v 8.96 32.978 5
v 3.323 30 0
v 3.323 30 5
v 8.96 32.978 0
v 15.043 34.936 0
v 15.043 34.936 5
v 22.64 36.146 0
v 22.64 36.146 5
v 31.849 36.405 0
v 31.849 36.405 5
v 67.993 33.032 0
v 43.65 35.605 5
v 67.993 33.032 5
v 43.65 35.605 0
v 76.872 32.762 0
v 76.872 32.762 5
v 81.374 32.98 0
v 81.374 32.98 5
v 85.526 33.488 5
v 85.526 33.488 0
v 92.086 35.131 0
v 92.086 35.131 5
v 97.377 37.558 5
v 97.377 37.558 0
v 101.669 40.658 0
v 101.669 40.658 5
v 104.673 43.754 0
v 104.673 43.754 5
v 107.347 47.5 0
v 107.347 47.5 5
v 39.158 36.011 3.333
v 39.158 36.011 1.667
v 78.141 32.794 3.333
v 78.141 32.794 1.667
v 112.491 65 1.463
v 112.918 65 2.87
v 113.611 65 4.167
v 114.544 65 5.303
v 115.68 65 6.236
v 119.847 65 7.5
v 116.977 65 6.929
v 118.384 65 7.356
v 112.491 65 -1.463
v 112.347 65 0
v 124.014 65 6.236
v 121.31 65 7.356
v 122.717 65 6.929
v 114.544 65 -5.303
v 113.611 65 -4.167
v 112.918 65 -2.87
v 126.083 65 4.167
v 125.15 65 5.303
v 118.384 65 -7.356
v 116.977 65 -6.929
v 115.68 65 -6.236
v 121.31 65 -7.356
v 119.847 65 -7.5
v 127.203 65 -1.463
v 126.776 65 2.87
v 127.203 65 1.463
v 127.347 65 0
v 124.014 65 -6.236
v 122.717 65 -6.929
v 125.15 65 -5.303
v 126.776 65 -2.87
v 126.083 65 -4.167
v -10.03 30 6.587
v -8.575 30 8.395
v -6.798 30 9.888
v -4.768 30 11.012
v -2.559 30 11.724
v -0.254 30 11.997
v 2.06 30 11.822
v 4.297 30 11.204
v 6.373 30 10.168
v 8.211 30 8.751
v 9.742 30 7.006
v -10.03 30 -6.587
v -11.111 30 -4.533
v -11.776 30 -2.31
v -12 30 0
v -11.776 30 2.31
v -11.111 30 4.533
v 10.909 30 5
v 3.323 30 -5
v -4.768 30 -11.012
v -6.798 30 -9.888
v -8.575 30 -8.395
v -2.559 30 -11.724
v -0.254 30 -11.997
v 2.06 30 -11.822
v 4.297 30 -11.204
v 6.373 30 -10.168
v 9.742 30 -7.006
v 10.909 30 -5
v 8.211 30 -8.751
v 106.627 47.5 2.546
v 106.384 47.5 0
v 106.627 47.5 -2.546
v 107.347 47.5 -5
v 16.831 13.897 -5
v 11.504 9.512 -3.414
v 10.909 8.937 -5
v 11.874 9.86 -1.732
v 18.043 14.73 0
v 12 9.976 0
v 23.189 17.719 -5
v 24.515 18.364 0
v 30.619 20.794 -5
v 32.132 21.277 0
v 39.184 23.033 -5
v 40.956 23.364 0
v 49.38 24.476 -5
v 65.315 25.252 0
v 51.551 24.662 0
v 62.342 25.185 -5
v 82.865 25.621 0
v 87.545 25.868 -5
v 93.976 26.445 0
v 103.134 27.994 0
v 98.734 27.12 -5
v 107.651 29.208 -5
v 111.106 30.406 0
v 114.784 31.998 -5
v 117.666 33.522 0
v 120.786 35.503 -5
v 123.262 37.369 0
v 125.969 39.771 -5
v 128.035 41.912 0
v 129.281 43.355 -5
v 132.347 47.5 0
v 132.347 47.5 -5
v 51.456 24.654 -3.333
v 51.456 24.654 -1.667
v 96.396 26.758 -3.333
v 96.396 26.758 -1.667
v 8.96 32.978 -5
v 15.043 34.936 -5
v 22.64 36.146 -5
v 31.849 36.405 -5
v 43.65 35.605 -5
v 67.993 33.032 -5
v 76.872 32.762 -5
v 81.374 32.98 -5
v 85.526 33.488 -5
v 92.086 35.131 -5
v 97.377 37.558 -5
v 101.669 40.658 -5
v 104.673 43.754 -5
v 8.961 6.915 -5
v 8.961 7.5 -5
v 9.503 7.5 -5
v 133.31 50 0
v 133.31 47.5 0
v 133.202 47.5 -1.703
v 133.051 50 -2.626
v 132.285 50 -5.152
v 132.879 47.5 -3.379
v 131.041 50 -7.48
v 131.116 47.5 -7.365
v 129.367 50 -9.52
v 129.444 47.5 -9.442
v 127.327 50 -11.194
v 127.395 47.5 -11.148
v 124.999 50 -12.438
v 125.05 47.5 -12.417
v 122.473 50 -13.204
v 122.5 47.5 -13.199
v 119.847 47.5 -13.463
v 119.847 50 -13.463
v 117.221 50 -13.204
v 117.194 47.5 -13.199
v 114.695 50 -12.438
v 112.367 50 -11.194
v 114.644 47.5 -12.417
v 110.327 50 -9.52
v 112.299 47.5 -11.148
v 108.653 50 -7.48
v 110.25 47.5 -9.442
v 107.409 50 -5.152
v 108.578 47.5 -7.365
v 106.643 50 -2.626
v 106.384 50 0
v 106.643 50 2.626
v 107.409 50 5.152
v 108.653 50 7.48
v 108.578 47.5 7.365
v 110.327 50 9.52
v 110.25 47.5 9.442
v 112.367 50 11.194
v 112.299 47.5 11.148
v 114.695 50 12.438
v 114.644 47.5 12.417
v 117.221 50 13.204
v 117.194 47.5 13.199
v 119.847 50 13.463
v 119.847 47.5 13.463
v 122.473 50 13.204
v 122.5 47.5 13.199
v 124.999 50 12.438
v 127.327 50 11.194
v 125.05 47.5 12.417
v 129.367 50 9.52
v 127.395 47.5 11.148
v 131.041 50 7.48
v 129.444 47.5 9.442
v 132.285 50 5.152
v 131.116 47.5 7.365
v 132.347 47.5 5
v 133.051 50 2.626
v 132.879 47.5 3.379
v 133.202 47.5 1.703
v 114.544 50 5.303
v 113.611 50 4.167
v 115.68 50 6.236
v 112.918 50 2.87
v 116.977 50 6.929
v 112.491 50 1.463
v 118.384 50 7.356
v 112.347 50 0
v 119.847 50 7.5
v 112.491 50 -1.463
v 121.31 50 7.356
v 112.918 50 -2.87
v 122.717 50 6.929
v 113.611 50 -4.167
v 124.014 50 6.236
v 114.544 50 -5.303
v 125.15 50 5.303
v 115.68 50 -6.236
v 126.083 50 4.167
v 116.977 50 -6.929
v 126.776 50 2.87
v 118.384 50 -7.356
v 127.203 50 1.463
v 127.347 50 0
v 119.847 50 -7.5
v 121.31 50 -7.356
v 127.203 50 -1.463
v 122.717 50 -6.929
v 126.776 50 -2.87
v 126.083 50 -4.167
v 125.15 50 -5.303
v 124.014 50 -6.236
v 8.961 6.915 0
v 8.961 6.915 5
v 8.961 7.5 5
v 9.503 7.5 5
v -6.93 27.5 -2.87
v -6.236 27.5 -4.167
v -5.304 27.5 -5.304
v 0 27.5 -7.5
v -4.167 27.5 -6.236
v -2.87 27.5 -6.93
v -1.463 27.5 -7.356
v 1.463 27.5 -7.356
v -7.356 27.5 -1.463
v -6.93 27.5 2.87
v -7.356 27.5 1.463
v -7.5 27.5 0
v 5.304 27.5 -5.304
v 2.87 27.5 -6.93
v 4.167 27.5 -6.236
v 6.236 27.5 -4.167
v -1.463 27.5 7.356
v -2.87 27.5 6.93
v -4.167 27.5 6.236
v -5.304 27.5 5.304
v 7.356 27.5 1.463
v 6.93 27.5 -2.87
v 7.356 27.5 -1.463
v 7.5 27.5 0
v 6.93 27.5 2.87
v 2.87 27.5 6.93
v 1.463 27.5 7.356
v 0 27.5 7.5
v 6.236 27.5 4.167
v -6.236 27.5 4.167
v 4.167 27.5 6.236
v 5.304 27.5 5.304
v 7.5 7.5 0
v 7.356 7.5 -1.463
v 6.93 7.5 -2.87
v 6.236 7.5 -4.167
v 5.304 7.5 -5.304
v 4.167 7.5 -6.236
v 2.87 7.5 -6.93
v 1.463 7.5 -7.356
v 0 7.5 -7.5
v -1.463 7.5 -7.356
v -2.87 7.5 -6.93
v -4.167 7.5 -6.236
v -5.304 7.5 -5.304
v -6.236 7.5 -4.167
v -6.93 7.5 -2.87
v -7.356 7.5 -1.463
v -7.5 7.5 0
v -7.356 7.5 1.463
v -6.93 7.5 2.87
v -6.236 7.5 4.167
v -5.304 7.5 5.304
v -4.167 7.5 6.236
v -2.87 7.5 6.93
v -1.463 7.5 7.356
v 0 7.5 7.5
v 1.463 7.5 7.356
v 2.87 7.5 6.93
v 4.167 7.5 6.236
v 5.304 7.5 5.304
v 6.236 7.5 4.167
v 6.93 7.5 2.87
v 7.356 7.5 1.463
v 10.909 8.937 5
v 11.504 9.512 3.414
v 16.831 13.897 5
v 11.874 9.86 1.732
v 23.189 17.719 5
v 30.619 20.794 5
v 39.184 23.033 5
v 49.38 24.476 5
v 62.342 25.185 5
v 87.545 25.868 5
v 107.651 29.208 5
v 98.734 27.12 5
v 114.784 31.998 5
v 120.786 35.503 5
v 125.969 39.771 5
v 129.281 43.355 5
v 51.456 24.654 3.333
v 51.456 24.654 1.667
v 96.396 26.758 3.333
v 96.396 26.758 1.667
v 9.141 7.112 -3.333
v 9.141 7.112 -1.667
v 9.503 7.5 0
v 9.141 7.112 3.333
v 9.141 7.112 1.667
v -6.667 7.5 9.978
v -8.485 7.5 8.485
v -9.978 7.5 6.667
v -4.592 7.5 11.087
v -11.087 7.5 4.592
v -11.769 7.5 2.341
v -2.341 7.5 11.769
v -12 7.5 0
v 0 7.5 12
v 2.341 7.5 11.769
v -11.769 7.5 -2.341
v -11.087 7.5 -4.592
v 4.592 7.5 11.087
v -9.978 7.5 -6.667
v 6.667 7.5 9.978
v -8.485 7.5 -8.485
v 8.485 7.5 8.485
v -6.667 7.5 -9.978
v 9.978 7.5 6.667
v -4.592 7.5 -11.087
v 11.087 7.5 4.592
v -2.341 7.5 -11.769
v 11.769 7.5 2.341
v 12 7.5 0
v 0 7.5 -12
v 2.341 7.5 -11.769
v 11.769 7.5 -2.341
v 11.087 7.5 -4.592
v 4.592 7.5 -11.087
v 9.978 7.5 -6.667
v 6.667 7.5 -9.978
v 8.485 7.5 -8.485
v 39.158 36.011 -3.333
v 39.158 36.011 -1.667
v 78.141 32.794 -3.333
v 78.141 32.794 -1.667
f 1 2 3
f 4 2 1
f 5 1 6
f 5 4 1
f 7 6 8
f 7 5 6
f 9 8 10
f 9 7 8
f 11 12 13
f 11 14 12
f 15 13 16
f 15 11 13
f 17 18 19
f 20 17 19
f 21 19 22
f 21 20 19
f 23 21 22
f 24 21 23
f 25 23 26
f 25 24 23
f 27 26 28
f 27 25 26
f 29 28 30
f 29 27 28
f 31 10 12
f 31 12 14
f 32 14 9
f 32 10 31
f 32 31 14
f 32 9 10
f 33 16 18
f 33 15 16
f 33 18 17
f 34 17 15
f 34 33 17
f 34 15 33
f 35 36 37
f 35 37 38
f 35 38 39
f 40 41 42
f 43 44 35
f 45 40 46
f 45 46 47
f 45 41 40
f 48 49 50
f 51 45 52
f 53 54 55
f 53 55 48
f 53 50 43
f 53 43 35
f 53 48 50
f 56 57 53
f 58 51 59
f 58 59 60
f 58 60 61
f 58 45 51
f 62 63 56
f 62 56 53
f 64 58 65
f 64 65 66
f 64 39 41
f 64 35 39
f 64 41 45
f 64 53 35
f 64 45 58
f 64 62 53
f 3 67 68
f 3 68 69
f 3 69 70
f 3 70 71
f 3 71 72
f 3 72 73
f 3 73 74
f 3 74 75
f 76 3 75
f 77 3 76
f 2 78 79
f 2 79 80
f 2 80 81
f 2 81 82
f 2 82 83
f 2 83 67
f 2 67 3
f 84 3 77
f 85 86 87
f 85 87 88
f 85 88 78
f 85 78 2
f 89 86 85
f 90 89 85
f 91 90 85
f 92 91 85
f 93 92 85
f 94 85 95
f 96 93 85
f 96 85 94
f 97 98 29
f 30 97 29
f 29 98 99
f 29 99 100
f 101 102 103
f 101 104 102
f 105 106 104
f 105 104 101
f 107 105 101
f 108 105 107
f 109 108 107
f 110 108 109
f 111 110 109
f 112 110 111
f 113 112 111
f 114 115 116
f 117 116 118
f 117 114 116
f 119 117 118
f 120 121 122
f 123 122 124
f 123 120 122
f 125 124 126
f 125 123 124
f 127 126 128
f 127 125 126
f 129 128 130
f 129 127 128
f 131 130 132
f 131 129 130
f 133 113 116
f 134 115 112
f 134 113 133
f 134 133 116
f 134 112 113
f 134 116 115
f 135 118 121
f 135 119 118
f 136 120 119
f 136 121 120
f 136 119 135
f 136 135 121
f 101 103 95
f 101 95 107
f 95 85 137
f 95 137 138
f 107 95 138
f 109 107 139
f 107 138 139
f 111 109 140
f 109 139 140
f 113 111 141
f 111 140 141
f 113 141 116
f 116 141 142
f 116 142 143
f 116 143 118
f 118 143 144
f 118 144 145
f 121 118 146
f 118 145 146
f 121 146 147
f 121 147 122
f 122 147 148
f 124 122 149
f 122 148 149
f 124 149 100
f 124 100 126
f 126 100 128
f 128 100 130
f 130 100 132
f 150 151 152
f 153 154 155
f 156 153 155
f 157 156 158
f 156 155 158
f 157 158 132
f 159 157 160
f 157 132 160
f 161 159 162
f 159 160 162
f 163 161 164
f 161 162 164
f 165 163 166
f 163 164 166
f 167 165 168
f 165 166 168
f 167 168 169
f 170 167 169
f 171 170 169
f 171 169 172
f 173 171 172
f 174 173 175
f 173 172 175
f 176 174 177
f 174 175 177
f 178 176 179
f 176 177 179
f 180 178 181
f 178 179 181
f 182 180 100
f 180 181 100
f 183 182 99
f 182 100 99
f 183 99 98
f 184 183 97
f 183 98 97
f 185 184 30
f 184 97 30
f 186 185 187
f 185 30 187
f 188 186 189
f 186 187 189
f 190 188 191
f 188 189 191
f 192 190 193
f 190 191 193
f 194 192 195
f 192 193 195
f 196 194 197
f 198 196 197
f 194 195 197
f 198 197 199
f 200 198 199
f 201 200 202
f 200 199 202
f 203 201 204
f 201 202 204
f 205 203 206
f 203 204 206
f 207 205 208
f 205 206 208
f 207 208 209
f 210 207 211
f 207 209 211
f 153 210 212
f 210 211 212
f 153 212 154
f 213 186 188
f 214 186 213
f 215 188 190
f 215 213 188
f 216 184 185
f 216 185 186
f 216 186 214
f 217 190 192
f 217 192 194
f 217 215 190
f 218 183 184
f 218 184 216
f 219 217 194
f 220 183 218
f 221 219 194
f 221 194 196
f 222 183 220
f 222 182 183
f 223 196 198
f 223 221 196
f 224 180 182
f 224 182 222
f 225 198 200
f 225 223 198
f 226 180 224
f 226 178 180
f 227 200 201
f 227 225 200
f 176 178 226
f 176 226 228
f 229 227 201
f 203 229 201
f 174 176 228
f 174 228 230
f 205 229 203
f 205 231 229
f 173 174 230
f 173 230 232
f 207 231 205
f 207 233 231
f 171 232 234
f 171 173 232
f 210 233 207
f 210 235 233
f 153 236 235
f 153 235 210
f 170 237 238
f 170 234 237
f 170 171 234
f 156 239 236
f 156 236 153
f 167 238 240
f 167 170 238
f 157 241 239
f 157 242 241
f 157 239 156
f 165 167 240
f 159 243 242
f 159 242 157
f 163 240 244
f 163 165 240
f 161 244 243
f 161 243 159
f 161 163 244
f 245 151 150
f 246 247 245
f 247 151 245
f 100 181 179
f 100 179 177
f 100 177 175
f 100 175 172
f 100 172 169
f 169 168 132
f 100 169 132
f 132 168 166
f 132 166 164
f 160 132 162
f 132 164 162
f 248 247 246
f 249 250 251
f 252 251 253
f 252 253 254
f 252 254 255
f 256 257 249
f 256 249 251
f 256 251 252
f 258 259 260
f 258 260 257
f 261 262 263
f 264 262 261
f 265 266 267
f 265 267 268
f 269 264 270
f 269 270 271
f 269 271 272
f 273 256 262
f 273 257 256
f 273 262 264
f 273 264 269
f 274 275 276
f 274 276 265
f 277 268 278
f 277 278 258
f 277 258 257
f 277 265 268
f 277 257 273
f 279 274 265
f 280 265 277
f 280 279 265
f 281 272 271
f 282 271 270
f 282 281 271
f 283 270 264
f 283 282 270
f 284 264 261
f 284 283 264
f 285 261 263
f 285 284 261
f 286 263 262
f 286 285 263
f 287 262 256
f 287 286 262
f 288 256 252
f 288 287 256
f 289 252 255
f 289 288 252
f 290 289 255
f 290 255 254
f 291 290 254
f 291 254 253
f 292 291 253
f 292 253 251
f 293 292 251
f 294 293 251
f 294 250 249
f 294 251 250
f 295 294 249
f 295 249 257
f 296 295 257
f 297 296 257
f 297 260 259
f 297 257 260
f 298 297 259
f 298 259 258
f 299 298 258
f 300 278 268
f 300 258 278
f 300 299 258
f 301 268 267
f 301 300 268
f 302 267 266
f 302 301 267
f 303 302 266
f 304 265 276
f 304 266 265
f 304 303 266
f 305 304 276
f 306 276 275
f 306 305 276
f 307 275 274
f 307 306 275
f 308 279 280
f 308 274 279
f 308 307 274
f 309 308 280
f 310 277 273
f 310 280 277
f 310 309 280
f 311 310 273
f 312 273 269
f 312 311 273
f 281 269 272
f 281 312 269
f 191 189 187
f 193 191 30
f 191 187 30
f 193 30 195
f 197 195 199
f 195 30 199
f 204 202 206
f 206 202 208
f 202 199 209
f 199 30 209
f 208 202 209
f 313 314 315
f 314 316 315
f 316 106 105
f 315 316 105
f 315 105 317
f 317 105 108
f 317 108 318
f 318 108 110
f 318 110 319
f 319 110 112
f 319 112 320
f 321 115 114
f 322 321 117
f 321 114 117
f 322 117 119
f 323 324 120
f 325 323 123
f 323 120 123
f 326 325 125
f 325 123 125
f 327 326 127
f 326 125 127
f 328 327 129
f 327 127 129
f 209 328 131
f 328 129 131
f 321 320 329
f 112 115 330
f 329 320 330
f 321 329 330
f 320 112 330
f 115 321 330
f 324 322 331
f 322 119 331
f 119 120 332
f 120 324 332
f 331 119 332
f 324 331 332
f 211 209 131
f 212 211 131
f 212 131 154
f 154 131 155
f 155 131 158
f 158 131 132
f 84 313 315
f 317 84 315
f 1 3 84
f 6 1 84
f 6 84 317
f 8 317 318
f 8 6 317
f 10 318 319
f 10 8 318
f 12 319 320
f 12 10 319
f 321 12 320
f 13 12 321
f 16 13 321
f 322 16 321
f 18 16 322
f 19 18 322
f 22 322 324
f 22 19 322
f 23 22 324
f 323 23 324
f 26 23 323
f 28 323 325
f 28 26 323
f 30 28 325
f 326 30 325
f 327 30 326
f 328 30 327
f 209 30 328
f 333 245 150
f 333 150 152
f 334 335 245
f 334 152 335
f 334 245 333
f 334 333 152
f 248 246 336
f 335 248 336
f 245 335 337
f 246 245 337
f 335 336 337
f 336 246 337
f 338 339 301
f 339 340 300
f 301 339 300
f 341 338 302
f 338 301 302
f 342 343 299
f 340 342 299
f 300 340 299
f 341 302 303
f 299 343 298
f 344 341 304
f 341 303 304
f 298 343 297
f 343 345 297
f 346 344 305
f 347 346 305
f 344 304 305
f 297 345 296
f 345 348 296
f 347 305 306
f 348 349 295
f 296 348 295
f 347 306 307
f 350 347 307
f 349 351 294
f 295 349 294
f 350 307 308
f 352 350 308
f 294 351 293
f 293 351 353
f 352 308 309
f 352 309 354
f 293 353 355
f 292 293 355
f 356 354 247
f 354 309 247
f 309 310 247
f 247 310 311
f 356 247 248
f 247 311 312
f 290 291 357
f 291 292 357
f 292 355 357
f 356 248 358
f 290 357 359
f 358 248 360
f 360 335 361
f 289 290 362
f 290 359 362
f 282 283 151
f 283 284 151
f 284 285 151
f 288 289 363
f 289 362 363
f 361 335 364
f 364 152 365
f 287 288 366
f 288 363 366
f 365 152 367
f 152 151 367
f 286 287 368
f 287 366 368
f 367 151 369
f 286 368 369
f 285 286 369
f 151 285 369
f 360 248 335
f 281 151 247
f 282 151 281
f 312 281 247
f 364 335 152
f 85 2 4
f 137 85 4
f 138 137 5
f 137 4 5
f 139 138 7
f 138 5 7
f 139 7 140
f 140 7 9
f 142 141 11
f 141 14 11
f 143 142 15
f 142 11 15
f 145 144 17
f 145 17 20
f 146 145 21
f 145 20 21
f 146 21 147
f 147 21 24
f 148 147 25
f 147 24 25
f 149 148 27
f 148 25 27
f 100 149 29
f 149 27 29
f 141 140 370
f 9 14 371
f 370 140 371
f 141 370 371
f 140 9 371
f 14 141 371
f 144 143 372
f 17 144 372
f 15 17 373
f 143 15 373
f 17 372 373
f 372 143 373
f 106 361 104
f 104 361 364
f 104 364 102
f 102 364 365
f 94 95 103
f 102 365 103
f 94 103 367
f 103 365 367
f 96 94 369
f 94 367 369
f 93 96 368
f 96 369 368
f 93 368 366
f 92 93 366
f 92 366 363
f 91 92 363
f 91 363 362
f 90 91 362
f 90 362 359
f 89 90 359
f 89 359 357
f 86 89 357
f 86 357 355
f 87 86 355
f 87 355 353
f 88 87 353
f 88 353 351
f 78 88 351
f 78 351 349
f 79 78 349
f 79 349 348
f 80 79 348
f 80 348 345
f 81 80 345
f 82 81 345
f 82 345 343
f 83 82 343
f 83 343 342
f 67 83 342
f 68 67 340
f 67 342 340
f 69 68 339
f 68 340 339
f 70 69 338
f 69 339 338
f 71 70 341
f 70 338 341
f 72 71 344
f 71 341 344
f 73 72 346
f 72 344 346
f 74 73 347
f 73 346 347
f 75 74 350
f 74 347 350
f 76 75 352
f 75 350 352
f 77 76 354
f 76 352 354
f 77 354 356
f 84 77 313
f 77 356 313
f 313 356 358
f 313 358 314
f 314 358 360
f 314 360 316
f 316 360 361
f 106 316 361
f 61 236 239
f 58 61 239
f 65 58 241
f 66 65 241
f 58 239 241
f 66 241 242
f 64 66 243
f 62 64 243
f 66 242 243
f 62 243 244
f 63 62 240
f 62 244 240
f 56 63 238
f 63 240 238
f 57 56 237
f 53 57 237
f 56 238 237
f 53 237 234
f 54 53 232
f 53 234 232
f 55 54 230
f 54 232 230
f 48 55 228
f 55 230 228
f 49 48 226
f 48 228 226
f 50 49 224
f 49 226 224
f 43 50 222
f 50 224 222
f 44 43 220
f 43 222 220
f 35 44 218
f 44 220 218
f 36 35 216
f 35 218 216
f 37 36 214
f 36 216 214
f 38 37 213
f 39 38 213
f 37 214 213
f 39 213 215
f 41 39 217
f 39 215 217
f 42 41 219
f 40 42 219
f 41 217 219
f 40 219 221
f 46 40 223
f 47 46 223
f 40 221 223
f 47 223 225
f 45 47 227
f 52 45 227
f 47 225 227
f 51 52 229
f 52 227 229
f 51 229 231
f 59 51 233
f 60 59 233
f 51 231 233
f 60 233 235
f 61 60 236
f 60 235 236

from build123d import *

# Parameters (mm, degrees)
BOSS_EXTRUDE1_START = 7.5
SKETCH1_R           = 12
SKETCH1_R_2         = 7.5005
BOSS_EXTRUDE1_DEPTH = 20
BOSS_EXTRUDE2_DEPTH = 5
BOSS_EXTRUDE3_START = 27.5
SKETCH1_2_R         = 12
SKETCH1_2_R_2       = 7.5005
BOSS_EXTRUDE3_DEPTH = 2.5
SKETCH3_R           = 13.462912018
BOSS_EXTRUDE4_DEPTH = 2.5
SKETCH5_R           = 7.5
BOSS_EXTRUDE5_DEPTH = 15


with BuildPart() as part:
    # Sketch1 → Boss-Extrude1 (new body)
    with BuildSketch(Plane(origin=(0, 0, 0), x_dir=(1, 0, 0), z_dir=(0, 1, 0)).offset(BOSS_EXTRUDE1_START)):
        Circle(SKETCH1_R)
        Circle(SKETCH1_R_2, mode=Mode.SUBTRACT)
    extrude(amount=BOSS_EXTRUDE1_DEPTH)

    # Sketch2 → Boss-Extrude2 (add, symmetric)
    with BuildSketch(Plane.XY):
        with BuildLine():
            Line((0, 27.5), (8.9613053, 27.5))
            Line((8.9613053, 27.5), (8.9613053, 6.915260629))
            add(Edge.make_bspline(
                [(8.9613053, 6.915260629), (42.430030167, 43.623802214), (104.826512854, 5.893256195), (132.347009744, 47.5)],
                knots=[0, 0, 0, 0, 1, 1, 1, 1], degree=3))
            Line((132.347009744, 47.5), (107.347009744, 47.5))
            add(Edge.make_bspline(
                [(0, 27.5), (29.095772849, 52.440117374), (86.574153169, 13.532011579), (107.347009744, 47.5)],
                knots=[0, 0, 0, 0, 1, 1, 1, 1], degree=3))
        make_face()
    extrude(amount=BOSS_EXTRUDE2_DEPTH, both=True)

    # Sketch1<2> → Boss-Extrude3 (add)
    with BuildSketch(Plane(origin=(0, 0, 0), x_dir=(1, 0, 0), z_dir=(0, 1, 0)).offset(BOSS_EXTRUDE3_START)):
        Circle(SKETCH1_2_R)
        Circle(SKETCH1_2_R_2, mode=Mode.SUBTRACT)
        Circle(SKETCH1_2_R_2)
    extrude(amount=BOSS_EXTRUDE3_DEPTH)

    # Sketch3 → Boss-Extrude4 (add)
    with BuildSketch(Plane(origin=(0, 47.5, 0), x_dir=(1, 0, 0), z_dir=(0, 1, 0))):
        with Locations((119.847009744, 0)):
            Circle(SKETCH3_R)
    extrude(amount=BOSS_EXTRUDE4_DEPTH)

    # Sketch5 → Boss-Extrude5 (add)
    with BuildSketch(Plane(origin=(0, 50, 0), x_dir=(1, 0, 0), z_dir=(0, 1, 0))):
        with Locations((119.847009744, 0)):
            Circle(SKETCH5_R)
    extrude(amount=BOSS_EXTRUDE5_DEPTH)


solid = part.part
